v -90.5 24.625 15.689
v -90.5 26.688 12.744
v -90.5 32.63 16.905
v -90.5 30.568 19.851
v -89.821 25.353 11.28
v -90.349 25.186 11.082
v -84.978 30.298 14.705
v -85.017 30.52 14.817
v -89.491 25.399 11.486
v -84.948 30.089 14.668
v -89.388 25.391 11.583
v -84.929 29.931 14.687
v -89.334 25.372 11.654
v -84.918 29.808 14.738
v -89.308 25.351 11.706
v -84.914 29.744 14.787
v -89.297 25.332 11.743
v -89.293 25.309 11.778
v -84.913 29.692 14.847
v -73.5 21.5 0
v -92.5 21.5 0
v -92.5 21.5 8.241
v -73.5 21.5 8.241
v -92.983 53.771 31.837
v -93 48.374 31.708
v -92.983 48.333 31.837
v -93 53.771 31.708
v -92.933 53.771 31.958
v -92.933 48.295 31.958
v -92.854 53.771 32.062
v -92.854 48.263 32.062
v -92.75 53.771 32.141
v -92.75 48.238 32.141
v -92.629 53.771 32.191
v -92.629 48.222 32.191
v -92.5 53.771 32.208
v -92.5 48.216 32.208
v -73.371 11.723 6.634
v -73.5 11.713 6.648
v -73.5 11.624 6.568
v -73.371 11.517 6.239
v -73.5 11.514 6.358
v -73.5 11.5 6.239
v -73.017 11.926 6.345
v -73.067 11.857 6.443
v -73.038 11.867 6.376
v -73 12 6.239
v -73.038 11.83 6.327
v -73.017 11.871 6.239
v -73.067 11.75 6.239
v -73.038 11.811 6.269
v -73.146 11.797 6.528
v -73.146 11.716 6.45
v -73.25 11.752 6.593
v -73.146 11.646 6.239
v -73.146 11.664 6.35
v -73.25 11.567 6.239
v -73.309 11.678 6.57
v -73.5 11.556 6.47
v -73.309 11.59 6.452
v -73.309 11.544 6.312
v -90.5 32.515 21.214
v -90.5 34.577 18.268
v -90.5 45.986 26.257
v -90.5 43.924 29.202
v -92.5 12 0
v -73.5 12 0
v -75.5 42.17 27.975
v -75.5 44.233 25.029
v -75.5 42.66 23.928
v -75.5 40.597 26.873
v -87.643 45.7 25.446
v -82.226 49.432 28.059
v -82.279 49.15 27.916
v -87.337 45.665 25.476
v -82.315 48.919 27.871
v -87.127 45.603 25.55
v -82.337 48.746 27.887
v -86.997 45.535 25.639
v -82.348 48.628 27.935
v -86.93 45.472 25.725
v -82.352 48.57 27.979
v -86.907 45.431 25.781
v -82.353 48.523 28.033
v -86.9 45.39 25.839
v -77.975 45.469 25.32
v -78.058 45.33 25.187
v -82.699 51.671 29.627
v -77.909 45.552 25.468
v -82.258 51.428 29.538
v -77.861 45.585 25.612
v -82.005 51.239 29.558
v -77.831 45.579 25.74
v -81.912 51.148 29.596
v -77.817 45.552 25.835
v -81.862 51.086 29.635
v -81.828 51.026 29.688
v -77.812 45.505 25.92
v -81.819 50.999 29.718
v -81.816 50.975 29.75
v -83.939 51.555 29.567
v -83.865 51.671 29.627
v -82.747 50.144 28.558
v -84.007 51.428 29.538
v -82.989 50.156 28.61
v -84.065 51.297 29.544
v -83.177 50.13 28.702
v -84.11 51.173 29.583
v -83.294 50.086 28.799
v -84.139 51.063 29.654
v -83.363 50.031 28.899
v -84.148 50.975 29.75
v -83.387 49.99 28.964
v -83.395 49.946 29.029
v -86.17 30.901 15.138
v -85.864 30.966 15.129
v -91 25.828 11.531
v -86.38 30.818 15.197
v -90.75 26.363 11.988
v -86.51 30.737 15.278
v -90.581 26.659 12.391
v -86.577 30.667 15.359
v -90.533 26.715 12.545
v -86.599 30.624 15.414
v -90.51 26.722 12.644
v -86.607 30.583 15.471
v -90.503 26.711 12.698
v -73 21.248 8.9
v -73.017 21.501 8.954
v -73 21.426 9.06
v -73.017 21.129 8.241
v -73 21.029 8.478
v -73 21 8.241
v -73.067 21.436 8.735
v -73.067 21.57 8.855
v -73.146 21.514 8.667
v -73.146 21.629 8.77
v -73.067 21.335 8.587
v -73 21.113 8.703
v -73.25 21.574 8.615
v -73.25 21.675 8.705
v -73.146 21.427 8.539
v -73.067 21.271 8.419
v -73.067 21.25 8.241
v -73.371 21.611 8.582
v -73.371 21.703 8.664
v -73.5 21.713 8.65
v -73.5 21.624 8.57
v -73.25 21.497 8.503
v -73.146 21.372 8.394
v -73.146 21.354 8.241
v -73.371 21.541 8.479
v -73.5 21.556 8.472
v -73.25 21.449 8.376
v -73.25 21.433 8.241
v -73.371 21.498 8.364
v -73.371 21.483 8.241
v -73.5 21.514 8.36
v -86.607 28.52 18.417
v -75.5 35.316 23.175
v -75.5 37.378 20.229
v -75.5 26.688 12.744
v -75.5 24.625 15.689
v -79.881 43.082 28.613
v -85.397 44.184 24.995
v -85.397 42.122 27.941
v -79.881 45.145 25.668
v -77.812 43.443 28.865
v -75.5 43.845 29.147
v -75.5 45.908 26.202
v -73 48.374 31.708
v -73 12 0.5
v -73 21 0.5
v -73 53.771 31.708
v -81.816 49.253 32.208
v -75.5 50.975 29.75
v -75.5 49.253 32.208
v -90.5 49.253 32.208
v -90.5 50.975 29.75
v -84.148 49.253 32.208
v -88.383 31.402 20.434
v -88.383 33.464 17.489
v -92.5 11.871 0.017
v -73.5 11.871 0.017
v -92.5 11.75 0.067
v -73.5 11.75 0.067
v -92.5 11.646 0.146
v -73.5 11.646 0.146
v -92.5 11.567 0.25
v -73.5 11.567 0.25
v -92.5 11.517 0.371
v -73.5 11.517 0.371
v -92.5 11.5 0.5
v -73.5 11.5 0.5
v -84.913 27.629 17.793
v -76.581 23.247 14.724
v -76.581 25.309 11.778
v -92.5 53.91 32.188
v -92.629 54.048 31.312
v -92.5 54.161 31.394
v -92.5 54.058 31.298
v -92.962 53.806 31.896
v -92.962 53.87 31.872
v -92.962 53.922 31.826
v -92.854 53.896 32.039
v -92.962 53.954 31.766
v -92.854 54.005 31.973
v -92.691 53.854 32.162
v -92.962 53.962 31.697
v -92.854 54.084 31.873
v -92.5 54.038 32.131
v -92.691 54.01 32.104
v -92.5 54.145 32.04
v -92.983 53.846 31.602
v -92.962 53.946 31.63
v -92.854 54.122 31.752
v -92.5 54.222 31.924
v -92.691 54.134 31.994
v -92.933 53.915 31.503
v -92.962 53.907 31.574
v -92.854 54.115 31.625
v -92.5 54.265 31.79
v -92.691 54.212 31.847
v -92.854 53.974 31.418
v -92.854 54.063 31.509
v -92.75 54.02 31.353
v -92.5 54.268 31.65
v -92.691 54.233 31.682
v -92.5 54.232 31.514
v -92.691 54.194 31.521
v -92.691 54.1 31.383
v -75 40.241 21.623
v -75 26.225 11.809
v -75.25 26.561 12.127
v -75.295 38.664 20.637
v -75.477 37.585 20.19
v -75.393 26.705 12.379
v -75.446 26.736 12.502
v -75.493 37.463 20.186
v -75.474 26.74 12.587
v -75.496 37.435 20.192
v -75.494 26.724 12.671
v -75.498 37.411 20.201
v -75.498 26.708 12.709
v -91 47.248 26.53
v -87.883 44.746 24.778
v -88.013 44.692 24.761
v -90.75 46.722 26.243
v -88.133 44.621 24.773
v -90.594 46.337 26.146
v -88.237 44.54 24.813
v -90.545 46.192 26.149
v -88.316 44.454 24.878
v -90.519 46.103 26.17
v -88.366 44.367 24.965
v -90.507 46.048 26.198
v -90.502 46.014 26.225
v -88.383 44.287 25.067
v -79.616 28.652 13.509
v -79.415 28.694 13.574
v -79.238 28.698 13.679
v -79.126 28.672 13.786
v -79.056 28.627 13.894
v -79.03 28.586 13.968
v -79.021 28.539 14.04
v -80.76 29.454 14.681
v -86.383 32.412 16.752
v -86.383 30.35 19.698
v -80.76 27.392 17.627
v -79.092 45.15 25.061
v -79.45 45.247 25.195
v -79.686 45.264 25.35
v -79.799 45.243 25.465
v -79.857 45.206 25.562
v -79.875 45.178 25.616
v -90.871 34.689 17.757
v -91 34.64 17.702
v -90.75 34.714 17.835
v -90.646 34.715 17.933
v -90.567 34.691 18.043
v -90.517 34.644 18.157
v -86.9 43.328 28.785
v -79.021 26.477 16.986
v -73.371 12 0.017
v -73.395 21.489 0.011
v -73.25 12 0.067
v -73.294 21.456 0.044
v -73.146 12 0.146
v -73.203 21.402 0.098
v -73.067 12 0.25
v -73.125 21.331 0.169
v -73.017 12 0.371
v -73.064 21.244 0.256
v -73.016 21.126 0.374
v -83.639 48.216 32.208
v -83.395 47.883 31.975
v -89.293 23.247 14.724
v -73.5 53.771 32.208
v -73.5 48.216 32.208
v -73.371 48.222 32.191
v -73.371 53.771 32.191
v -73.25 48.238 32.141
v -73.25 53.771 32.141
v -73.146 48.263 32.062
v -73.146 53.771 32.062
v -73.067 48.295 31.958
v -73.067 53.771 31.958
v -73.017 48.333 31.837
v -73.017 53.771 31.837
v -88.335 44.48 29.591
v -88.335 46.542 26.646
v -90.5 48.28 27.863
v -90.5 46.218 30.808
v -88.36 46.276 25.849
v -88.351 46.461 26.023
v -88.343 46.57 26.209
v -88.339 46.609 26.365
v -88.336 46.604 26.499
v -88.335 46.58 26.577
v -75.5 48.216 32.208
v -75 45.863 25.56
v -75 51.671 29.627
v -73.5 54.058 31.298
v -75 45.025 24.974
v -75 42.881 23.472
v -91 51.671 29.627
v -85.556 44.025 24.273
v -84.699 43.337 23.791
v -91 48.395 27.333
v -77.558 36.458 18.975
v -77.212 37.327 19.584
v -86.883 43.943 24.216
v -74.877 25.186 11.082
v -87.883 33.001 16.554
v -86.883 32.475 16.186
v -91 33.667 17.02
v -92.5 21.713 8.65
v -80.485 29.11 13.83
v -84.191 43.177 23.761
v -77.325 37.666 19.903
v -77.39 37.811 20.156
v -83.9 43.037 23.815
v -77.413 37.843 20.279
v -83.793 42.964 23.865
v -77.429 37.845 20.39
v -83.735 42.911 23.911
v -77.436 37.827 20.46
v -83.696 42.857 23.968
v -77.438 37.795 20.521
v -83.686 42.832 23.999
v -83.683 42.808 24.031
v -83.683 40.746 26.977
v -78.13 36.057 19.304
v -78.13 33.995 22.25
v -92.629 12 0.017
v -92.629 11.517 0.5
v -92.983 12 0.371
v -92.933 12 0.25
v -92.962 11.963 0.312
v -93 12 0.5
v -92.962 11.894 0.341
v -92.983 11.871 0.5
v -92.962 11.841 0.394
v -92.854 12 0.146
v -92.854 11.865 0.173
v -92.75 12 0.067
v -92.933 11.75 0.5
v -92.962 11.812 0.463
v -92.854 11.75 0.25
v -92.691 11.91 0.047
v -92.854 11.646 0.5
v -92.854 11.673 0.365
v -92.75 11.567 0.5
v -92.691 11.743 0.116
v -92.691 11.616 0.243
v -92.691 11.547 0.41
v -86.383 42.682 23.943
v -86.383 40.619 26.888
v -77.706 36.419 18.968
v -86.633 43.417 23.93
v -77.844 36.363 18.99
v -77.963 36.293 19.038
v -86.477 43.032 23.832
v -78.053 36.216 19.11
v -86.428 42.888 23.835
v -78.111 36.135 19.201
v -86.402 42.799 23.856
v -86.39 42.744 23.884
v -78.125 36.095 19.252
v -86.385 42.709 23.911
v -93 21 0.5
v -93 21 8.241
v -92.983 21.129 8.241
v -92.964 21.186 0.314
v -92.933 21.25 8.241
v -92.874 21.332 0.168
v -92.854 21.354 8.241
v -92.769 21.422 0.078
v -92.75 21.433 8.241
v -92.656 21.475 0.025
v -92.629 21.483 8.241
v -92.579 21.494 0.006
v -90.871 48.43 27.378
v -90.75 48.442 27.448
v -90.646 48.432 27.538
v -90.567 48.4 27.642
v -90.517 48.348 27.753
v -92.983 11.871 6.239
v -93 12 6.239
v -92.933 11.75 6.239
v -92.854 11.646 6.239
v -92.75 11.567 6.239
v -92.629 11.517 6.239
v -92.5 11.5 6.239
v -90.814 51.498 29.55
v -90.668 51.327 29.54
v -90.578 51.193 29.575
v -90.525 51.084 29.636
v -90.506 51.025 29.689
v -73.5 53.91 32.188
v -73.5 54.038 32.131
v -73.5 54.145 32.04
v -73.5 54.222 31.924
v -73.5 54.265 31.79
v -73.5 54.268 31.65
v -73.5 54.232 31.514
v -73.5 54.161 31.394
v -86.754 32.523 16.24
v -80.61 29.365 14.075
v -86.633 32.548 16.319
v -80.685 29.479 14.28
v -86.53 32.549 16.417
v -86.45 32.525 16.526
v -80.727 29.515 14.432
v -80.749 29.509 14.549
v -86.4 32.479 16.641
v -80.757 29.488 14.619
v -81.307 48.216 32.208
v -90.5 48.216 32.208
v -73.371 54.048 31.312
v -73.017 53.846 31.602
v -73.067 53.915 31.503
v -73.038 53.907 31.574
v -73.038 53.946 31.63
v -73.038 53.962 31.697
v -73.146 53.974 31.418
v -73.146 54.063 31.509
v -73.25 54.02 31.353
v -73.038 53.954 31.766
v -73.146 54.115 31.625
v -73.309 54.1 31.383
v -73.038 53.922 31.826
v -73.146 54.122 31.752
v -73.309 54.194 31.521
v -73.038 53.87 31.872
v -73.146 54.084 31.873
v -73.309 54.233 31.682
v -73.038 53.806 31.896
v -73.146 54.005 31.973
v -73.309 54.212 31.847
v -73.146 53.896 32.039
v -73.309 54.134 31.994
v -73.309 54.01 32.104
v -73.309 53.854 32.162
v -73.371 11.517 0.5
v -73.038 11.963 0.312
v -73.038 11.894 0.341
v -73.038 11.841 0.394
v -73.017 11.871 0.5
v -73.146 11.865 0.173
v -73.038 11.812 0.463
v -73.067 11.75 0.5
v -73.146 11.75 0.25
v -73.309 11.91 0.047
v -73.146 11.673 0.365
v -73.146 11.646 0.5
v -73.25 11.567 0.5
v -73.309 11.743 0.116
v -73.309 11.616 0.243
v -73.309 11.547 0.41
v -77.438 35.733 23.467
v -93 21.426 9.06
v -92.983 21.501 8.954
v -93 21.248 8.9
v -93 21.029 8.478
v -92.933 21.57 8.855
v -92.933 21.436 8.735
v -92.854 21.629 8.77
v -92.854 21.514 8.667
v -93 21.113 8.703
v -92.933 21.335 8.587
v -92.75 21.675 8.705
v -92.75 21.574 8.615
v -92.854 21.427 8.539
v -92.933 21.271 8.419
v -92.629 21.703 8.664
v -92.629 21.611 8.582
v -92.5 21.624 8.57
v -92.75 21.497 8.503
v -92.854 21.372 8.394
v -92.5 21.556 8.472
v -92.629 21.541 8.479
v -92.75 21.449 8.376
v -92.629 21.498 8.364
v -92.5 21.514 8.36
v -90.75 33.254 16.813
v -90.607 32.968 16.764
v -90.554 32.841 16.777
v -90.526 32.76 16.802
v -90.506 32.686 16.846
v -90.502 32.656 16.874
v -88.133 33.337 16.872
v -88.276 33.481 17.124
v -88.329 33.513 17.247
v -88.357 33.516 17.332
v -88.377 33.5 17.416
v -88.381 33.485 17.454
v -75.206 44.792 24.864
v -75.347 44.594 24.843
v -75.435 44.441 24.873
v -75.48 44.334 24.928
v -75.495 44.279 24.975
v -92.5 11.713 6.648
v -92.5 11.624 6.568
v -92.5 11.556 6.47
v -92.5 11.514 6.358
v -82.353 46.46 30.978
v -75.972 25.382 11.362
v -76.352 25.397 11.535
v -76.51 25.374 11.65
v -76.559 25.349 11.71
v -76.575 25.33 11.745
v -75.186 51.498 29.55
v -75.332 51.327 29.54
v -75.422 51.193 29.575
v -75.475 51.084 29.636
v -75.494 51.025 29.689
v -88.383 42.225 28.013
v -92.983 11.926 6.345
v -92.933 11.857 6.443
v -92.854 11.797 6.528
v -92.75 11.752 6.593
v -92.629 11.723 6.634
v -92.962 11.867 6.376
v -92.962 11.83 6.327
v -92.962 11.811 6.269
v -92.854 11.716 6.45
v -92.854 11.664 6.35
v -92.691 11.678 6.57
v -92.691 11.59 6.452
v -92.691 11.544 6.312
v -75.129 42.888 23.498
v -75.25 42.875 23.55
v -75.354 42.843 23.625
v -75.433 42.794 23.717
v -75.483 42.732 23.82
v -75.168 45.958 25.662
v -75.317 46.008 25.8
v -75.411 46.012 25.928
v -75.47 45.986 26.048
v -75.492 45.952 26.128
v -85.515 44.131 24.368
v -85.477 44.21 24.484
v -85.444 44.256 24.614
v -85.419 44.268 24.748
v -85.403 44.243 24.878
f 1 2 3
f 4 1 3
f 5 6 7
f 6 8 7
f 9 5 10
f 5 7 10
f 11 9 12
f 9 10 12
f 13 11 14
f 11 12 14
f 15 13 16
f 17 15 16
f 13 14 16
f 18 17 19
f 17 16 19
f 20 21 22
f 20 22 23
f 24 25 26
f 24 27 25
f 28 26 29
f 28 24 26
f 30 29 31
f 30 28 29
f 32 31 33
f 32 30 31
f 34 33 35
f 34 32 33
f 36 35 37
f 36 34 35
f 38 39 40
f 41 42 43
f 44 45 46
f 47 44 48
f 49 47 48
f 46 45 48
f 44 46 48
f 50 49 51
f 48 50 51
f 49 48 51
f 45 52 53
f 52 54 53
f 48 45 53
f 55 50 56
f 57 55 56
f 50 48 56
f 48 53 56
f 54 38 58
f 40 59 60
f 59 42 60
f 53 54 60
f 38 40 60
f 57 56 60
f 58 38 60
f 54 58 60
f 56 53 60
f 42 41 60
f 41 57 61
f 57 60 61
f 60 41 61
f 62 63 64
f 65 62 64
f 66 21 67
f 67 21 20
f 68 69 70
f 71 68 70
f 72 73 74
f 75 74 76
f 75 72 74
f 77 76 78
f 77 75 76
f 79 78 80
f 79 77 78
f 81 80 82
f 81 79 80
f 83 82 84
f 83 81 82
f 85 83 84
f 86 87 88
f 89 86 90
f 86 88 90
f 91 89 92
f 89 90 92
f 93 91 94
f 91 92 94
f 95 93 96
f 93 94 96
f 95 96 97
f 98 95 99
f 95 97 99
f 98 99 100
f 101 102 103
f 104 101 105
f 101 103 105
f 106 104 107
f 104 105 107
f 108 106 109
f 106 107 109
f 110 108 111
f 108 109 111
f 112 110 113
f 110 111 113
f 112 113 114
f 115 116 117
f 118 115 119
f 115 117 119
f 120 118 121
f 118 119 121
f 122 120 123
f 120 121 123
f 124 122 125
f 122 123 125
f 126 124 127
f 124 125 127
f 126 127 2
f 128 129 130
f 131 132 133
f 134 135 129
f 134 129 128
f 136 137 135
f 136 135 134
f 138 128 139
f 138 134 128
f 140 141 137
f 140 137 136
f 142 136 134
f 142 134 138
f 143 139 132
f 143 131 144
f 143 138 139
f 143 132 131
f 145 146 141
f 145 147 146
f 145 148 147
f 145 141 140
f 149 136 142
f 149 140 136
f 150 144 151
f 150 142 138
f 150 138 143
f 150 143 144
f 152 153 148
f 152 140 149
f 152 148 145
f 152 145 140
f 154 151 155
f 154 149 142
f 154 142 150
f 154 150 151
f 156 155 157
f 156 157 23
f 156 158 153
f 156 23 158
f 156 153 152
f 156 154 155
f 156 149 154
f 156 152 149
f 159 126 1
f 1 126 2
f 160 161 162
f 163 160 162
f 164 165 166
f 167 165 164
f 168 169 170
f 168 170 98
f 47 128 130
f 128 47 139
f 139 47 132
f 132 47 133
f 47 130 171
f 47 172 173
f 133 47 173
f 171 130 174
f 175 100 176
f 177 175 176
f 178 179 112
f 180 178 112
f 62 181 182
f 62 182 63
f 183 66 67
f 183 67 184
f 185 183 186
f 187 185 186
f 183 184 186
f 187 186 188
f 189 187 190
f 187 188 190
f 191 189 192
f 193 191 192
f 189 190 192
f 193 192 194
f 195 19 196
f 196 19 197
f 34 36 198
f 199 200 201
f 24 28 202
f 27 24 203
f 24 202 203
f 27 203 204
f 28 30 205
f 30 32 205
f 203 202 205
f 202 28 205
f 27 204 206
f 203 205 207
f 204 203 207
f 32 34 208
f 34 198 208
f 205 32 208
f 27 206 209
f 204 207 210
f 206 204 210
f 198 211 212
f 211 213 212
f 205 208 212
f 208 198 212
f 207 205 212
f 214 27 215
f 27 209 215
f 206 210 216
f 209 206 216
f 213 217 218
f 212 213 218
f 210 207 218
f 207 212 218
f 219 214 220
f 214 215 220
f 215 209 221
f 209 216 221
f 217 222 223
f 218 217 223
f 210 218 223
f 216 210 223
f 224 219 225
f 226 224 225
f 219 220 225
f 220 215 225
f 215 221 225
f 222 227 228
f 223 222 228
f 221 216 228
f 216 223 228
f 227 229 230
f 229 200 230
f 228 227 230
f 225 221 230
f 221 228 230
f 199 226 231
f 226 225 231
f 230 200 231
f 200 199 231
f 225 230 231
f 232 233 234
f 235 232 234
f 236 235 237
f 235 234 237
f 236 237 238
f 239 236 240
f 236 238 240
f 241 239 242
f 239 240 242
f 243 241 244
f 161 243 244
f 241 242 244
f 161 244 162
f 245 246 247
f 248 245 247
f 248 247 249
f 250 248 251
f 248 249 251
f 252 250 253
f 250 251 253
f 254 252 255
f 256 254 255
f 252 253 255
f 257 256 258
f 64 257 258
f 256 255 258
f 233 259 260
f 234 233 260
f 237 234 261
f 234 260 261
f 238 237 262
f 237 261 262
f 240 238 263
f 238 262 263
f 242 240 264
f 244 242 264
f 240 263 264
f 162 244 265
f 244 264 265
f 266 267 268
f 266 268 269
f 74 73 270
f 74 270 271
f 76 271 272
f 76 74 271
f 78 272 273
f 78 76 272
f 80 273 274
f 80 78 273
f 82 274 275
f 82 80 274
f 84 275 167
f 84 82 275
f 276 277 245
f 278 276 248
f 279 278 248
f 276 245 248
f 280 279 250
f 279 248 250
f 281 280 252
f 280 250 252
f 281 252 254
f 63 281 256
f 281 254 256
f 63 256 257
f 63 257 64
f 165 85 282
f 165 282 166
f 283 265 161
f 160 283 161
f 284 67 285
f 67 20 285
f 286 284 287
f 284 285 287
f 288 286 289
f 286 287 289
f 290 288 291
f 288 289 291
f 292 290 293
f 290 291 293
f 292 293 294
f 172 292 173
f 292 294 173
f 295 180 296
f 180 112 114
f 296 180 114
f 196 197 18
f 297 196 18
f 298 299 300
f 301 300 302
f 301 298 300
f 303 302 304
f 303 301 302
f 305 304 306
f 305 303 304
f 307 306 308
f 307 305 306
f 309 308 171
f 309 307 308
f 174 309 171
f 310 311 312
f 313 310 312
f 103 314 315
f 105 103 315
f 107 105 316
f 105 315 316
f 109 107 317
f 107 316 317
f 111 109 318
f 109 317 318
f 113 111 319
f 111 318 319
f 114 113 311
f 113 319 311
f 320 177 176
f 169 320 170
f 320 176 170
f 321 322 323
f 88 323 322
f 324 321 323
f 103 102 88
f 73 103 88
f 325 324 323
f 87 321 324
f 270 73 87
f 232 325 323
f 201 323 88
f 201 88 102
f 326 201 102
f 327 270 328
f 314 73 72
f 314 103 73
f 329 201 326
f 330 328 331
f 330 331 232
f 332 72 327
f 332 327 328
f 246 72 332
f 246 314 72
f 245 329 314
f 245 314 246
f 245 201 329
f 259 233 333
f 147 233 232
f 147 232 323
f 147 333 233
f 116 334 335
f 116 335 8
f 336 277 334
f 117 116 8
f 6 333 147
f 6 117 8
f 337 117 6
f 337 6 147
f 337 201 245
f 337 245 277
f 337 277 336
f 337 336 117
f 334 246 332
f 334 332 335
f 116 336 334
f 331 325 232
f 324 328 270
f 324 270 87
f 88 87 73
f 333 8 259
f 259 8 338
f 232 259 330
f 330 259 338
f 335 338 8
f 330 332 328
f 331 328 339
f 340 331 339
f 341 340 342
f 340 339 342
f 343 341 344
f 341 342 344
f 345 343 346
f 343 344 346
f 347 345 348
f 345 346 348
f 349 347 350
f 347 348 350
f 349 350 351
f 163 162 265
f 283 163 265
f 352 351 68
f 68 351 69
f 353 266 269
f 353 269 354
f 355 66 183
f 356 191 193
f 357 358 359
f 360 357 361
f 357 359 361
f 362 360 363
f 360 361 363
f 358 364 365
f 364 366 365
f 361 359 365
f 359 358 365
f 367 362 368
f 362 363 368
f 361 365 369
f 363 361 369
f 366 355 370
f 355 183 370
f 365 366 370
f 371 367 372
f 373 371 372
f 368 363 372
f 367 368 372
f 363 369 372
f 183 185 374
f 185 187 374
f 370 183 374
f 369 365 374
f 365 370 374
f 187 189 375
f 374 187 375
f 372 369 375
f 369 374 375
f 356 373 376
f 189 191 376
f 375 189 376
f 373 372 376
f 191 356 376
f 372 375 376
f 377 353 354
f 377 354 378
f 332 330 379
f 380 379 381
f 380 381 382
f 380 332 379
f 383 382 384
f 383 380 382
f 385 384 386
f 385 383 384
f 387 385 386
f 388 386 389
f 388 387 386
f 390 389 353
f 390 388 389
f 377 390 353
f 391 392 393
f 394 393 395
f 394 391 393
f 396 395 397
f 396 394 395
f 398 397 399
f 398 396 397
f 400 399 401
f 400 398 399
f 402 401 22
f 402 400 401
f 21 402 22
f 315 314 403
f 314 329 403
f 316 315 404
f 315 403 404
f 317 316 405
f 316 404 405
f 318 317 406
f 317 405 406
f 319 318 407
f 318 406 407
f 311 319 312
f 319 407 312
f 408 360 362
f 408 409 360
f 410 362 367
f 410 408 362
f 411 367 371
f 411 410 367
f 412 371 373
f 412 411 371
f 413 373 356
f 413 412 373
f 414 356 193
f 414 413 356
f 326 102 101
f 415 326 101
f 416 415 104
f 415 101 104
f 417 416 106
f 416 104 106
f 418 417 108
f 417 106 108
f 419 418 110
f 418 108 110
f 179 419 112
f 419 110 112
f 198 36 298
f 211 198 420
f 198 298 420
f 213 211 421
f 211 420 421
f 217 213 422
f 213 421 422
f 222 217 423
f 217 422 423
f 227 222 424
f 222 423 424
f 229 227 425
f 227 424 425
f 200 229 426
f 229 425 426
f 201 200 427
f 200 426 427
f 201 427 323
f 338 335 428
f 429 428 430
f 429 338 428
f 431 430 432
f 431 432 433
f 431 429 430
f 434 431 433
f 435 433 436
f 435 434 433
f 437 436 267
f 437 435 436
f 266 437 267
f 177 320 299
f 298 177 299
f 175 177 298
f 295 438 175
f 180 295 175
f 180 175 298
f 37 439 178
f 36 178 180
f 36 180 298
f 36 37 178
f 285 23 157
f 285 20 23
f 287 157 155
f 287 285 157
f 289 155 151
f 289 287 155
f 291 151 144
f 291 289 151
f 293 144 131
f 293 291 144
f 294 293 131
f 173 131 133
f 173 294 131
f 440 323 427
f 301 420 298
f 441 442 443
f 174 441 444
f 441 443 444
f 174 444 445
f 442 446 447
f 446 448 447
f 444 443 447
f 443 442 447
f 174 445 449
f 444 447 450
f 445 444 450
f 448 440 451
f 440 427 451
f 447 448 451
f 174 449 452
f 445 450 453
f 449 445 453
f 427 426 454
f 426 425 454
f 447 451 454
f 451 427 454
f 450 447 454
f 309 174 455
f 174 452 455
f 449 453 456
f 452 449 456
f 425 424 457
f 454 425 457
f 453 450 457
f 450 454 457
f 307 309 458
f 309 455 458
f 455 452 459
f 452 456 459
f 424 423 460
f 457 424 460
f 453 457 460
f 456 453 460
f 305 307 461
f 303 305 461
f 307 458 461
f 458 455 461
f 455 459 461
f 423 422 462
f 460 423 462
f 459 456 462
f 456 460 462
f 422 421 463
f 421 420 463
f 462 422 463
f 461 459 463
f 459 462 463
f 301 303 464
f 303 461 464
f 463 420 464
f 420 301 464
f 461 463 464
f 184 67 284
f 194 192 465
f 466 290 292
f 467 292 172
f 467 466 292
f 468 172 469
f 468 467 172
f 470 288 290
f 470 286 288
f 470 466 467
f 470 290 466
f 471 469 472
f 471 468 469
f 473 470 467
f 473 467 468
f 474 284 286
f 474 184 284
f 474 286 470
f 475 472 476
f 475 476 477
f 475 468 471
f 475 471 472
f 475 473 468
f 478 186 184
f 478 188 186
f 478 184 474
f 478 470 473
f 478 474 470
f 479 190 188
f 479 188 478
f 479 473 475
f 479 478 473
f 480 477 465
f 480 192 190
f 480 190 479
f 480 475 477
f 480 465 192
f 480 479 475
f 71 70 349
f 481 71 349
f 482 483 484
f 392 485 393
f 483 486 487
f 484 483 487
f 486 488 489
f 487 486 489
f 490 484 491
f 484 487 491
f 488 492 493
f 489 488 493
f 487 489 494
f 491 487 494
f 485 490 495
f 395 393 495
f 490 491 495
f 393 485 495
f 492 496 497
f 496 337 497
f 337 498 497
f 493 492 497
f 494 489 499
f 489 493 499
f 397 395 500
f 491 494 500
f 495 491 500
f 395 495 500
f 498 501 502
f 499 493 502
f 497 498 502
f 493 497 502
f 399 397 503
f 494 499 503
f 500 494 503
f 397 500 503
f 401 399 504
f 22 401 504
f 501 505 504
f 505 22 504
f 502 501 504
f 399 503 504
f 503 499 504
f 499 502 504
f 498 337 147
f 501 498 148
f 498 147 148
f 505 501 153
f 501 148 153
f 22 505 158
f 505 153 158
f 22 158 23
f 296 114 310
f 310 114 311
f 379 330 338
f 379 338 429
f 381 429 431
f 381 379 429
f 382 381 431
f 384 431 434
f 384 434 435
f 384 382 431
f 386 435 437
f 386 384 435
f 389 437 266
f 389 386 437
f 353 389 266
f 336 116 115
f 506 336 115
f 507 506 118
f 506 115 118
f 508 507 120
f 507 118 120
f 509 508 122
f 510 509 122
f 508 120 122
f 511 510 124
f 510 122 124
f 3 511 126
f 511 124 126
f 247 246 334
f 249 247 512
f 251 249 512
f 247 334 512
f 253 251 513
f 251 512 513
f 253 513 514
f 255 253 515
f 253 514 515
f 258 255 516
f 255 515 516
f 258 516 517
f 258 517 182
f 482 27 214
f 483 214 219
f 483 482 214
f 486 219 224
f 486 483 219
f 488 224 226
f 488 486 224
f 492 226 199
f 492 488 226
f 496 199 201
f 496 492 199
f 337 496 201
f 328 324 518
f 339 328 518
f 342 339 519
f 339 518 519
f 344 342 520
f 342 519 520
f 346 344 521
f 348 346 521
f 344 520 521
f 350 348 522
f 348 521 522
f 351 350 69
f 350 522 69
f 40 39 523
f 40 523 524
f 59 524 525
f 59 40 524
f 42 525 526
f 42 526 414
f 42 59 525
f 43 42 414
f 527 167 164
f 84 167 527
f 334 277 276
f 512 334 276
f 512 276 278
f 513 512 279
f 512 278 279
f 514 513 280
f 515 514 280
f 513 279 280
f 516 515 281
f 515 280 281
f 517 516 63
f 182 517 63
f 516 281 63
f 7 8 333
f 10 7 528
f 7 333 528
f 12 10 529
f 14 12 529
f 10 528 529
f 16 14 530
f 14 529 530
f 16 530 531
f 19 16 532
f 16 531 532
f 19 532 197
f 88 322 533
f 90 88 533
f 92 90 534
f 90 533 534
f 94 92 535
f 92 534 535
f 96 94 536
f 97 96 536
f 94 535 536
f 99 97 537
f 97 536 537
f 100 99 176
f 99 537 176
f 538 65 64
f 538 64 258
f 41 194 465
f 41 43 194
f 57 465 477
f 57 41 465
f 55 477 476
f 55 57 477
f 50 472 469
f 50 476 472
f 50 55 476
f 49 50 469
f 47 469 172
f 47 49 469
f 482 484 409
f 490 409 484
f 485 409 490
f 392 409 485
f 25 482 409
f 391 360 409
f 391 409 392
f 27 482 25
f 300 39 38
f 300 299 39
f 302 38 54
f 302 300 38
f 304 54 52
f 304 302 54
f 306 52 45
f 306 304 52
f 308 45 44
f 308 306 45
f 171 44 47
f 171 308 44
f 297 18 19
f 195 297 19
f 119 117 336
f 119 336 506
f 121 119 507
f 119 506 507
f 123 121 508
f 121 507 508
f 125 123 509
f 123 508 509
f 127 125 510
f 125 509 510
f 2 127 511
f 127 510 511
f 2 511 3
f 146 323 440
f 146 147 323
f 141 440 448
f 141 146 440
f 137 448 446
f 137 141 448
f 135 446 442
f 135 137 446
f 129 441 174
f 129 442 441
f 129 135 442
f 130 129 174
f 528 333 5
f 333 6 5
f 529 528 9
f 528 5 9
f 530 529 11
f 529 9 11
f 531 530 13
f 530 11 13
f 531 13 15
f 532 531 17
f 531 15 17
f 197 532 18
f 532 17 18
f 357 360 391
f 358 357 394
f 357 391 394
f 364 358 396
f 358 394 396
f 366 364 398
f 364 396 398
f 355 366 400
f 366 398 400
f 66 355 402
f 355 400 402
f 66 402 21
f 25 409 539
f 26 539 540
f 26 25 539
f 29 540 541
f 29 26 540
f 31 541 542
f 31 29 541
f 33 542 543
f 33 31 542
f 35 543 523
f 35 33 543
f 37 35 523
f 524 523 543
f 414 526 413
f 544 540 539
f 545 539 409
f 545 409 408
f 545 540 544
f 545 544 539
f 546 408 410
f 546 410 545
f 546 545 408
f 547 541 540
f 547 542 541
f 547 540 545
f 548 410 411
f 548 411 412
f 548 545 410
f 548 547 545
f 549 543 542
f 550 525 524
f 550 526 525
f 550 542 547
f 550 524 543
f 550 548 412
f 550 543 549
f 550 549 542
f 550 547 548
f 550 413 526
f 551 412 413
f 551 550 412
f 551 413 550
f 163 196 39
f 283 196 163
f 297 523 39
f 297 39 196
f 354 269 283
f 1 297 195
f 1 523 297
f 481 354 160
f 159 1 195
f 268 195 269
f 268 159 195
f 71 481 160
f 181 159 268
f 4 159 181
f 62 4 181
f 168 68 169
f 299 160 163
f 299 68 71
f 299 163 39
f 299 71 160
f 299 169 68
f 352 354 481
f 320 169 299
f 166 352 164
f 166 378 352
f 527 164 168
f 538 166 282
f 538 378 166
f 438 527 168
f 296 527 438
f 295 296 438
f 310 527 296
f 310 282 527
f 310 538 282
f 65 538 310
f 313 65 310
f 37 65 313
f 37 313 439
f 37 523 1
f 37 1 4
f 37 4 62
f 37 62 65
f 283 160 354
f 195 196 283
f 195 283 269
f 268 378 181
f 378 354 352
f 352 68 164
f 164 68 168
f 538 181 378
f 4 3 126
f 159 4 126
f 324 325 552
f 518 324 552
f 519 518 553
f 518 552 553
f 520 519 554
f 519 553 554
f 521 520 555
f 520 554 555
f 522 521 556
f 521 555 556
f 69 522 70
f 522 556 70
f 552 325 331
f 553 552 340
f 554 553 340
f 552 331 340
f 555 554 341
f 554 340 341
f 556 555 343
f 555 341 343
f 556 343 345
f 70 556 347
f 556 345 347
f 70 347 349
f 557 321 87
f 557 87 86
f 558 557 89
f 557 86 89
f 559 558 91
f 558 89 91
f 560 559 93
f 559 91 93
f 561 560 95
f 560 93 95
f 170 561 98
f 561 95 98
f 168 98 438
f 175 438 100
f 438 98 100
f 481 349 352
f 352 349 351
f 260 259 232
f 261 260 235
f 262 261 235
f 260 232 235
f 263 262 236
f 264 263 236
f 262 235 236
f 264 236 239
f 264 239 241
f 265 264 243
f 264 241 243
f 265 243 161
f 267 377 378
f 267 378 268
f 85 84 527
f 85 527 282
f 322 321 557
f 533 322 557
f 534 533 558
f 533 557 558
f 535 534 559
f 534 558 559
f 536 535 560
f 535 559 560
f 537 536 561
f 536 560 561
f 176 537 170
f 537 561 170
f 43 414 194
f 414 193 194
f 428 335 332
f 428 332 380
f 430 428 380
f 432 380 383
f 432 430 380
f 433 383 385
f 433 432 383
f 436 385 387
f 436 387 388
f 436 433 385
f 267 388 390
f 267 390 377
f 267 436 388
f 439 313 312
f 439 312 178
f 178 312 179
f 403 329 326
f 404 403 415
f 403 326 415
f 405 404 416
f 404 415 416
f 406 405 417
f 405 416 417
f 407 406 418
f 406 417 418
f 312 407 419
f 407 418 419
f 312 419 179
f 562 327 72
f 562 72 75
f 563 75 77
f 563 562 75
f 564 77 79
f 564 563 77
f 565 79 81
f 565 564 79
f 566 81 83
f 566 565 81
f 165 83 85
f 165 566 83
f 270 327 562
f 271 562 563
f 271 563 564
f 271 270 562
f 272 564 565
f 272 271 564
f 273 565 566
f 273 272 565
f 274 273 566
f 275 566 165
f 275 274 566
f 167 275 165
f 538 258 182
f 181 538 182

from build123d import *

# Parameters (mm, degrees)
SKETCH1_W           = 20
SKETCH1_H           = 10
BOSS_EXTRUDE1_DEPTH = 5
BOSS_EXTRUDE2_DEPTH = 20
CUT_EXTRUDE1_DEPTH  = 4.09576
FILLET1_R           = 0.5


with BuildPart() as part:
    # Sketch1 → Boss-Extrude1 (new body)
    with BuildSketch(Plane.XY):
        with Locations((-83, 16.5)):
            Rectangle(SKETCH1_W, SKETCH1_H)
    extrude(amount=BOSS_EXTRUDE1_DEPTH)

    # Sketch2 → Boss-Extrude2 (add)
    with BuildSketch(Plane.ZY.offset(93)):
        Polygon((5, 16.5), (1.498962309, 11.5), (6.498962309, 11.5), (32.208054955, 48.216389418), (32.208054955, 55.357129452), (8.501037691, 21.5), (5, 21.5), align=None)
    extrude(amount=-BOSS_EXTRUDE2_DEPTH)

    # Sketch3 → Cut-Extrude1 (cut)
    with BuildSketch(Plane(origin=(0, 3.079102266, -4.397413763), x_dir=(-1, 0, 0), z_dir=(0, 0.573576436, -0.819152044))):
        Polygon((90.5, 29.170685305), (90.5, 36.425657649), (86.606804382, 33.925761075), align=None)
        Polygon((76.580636571, 27.487763856), (89.293048323, 27.487763856), (84.912643674, 32.837907557), align=None)
        Polygon((79.020661139, 31.431370249), (75.5, 42.221469006), (75.5, 29.170685305), align=None)
        Polygon((83.682826439, 48.850072065), (75.5, 50.589500561), (75.5, 48.669091242), (77.437703633, 42.730430083), align=None)
        Polygon((77.812370658, 52.142645531), (81.816362113, 58.81968714), (75.5, 58.81968714), (75.5, 52.634187597), align=None)
        Polygon((90.5, 55.53027081), (90.5, 58.81968714), (84.148398738, 58.81968714), (83.395113947, 57.563512158), (88.334689519, 53.40846707), align=None)
        Polygon((86.899562452, 52.002175453), (85.397480311, 50.530274064), (79.880748536, 51.702969161), (82.353375162, 55.826312344), align=None)
        Polygon((90.5, 38.802476843), (90.5, 52.730114749), (88.38308654, 50.655735608), (88.38308654, 37.443165566), align=None)
        Polygon((86.38308654, 36.158926695), (80.76001209, 32.548241301), (78.130006045, 40.608666271), (86.38308654, 48.69592083), align=None)
    extrude(amount=-CUT_EXTRUDE1_DEPTH, mode=Mode.SUBTRACT)

    # Fillet1
    fillet1_edges = [part.edges().sort_by_distance(p)[0] for p in [
        (-88.38308654, 39.162299764, 20.868313128),
        (-90.5, 40.568657026, 21.853055085),
        (-89.44154327, 34.307489189, 17.468938167),
        (-89.44154327, 45.423467601, 25.252430045),
        (-85.864901733, 48.530564087, 27.428042427),
        (-90.5, 49.914103175, 28.396806926),
        (-87.324199369, 51.26136923, 29.340172774),
        (-89.41734476, 47.697797184, 26.844932764),
        (-83.771756342, 50.746870078, 28.979916589),
        (-84.626468807, 47.243065371, 26.526526121),
        (-81.117061849, 47.120517648, 26.440717281),
        (-82.639114423, 44.951387357, 24.9218759),
        (-86.148521381, 45.07393508, 25.007684739),
        (-88.553402191, 31.893356499, 15.778544259),
        (-88.553402191, 28.921893785, 13.697903667),
        (-90.5, 29.94579148, 14.414844551),
        (-83, 21.5, 8.501037691),
        (-83, 55.357129452, 32.208054955),
        (-83, 11.5, 6.498962309),
        (-93, 29.858194709, 19.353508632),
        (-93, 51.786759435, 32.208054955),
        (-93, 38.428564726, 20.354546323),
        (-73, 38.428564726, 20.354546323),
        (-73, 51.786759435, 32.208054955),
        (-73, 29.858194709, 19.353508632),
        (-83, 11.5, 0),
        (-93, 16.5, 0),
        (-73, 16.5, 0),
        (-80.560265036, 40.588280041, 21.866795268),
        (-76.468851816, 40.514154635, 21.814892099),
        (-79.59141322, 43.807166866, 24.120684086),
        (-75.5, 43.73304146, 24.068780918),
        (-73, 11.5, 3.249481154),
        (-93, 11.5, 3.249481154),
        (-76.656185329, 45.993180791, 25.651347516),
        (-79.814366386, 48.526613089, 27.425275908),
        (-93, 21.5, 4.250518846),
        (-78.658181056, 51.26136923, 29.340172774),
        (-75.5, 48.727936933, 27.566244381),
        (-73, 21.5, 4.250518846),
        (-87.102845999, 27.787050796, 12.903278052),
        (-80.746640123, 27.787050796, 12.903278052),
        (-82.936842447, 25.595760221, 11.368919873),
        (-77.26033057, 27.900251113, 12.982541767),
        (-77.26033057, 33.245539188, 16.725352771),
        (-75.5, 32.319616841, 16.077014963),
        (-86.38308654, 37.833613175, 19.937956762),
        (-82.256546293, 39.65611981, 21.214089647),
        (-79.445009068, 33.042417461, 16.583125407),
        (-83.571549315, 31.219910826, 15.306992522),
    ]]
    fillet(fillet1_edges, radius=FILLET1_R)


solid = part.part
